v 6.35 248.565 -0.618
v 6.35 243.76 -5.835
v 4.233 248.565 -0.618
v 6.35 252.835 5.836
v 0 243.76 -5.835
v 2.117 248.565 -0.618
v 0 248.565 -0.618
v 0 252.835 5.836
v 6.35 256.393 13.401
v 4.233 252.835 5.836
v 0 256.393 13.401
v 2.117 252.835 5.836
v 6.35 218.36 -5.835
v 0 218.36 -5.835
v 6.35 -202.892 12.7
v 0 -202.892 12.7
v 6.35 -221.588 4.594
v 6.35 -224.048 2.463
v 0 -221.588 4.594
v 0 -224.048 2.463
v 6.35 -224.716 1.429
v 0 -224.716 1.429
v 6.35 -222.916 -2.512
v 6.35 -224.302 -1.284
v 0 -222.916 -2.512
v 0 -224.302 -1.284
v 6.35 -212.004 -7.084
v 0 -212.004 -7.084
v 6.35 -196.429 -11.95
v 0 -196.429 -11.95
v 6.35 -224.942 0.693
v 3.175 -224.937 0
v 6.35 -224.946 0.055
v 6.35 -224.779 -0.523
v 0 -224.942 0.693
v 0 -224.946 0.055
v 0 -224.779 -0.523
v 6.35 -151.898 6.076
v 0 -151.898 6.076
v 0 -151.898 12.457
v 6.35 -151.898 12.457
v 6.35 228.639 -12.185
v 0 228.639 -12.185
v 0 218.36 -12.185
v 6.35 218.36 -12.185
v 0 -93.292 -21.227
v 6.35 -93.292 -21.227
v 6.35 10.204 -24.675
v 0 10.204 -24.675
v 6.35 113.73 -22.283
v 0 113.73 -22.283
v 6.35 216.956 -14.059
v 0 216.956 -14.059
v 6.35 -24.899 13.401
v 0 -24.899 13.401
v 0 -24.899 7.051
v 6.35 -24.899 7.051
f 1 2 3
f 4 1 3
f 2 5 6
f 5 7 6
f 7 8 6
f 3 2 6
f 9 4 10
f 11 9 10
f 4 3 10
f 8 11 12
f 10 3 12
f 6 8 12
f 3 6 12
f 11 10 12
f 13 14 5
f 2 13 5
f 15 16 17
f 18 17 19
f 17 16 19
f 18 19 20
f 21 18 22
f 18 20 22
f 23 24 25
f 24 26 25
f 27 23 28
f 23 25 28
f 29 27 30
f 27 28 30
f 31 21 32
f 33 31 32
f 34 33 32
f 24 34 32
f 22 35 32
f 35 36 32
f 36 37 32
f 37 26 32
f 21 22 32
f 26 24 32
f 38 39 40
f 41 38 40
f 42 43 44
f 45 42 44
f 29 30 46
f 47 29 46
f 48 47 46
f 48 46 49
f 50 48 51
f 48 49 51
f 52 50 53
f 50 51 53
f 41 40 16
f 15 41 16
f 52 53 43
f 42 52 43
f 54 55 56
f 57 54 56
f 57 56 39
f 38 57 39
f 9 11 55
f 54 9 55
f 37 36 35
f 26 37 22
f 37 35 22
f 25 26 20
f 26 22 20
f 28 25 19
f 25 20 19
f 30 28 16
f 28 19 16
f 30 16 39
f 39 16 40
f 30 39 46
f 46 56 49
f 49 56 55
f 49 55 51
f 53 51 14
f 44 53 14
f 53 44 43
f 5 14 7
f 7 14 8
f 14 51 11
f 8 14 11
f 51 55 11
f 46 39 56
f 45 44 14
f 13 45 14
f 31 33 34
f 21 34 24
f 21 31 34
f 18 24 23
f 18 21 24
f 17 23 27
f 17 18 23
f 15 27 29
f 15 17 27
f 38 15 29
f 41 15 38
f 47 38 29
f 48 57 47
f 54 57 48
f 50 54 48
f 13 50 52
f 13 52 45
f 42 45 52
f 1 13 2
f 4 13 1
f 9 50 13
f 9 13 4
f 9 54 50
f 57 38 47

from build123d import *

# Parameters (mm, degrees)
F1_DEPTH = 6.35


with BuildPart() as f1:
    # F0 (on Right) → F1 (new body)
    with BuildSketch(Plane.YZ):
        with BuildLine():
            Line((-151.8980418446, 6.0759130949), (-151.8980418446, 12.4565647503))
            Line((-151.8980418446, 12.4565647503), (-202.891856432, 12.7))
            add(Edge.make_bspline(
                [(-202.891856432, 12.7), (-215.1206120084, 8.6726070091), (-237.16462935, -1.3730042529), (-209.9079122757, -7.5103641369), (-196.4285242841, -11.9496378127)],
                knots=[0, 0, 0, 0, 0.4756763375, 1, 1, 1, 1], degree=3))
            ThreePointArc((-196.4285242841, -11.9496378127), (10.2042676339, -24.674803041), (216.9561811447, -14.0593998225))
            Line((216.9561811447, -14.0593998225), (228.6390024621, -12.1845068598))
            Line((228.6390024621, -12.1845068598), (218.3601457434, -12.1845068598))
            Line((218.3601457434, -12.1845068598), (218.3601457434, -5.8345068598))
            Line((218.3601457434, -5.8345068598), (243.7601457434, -5.8345068598))
            add(Edge.make_bspline(
                [(243.7601457434, -5.8345068598), (248.7731428179, -1.2775582425), (253.2495546938, 5.3213927641), (256.392930619, 13.4012833565)],
                knots=[19.1722123796, 19.1722123796, 19.1722123796, 19.1722123796, 38.5768547936, 38.5768547936, 38.5768547936, 38.5768547936], degree=3))
            Line((256.392930619, 13.4012833565), (-24.8988723263, 13.4012833565))
            Line((-24.8988723263, 13.4012833565), (-24.8988723263, 7.0512833565))
            Line((-24.8988723263, 7.0512833565), (-151.8980418446, 6.0759130949))
        make_face()
    extrude(amount=F1_DEPTH)


solid = f1.part
